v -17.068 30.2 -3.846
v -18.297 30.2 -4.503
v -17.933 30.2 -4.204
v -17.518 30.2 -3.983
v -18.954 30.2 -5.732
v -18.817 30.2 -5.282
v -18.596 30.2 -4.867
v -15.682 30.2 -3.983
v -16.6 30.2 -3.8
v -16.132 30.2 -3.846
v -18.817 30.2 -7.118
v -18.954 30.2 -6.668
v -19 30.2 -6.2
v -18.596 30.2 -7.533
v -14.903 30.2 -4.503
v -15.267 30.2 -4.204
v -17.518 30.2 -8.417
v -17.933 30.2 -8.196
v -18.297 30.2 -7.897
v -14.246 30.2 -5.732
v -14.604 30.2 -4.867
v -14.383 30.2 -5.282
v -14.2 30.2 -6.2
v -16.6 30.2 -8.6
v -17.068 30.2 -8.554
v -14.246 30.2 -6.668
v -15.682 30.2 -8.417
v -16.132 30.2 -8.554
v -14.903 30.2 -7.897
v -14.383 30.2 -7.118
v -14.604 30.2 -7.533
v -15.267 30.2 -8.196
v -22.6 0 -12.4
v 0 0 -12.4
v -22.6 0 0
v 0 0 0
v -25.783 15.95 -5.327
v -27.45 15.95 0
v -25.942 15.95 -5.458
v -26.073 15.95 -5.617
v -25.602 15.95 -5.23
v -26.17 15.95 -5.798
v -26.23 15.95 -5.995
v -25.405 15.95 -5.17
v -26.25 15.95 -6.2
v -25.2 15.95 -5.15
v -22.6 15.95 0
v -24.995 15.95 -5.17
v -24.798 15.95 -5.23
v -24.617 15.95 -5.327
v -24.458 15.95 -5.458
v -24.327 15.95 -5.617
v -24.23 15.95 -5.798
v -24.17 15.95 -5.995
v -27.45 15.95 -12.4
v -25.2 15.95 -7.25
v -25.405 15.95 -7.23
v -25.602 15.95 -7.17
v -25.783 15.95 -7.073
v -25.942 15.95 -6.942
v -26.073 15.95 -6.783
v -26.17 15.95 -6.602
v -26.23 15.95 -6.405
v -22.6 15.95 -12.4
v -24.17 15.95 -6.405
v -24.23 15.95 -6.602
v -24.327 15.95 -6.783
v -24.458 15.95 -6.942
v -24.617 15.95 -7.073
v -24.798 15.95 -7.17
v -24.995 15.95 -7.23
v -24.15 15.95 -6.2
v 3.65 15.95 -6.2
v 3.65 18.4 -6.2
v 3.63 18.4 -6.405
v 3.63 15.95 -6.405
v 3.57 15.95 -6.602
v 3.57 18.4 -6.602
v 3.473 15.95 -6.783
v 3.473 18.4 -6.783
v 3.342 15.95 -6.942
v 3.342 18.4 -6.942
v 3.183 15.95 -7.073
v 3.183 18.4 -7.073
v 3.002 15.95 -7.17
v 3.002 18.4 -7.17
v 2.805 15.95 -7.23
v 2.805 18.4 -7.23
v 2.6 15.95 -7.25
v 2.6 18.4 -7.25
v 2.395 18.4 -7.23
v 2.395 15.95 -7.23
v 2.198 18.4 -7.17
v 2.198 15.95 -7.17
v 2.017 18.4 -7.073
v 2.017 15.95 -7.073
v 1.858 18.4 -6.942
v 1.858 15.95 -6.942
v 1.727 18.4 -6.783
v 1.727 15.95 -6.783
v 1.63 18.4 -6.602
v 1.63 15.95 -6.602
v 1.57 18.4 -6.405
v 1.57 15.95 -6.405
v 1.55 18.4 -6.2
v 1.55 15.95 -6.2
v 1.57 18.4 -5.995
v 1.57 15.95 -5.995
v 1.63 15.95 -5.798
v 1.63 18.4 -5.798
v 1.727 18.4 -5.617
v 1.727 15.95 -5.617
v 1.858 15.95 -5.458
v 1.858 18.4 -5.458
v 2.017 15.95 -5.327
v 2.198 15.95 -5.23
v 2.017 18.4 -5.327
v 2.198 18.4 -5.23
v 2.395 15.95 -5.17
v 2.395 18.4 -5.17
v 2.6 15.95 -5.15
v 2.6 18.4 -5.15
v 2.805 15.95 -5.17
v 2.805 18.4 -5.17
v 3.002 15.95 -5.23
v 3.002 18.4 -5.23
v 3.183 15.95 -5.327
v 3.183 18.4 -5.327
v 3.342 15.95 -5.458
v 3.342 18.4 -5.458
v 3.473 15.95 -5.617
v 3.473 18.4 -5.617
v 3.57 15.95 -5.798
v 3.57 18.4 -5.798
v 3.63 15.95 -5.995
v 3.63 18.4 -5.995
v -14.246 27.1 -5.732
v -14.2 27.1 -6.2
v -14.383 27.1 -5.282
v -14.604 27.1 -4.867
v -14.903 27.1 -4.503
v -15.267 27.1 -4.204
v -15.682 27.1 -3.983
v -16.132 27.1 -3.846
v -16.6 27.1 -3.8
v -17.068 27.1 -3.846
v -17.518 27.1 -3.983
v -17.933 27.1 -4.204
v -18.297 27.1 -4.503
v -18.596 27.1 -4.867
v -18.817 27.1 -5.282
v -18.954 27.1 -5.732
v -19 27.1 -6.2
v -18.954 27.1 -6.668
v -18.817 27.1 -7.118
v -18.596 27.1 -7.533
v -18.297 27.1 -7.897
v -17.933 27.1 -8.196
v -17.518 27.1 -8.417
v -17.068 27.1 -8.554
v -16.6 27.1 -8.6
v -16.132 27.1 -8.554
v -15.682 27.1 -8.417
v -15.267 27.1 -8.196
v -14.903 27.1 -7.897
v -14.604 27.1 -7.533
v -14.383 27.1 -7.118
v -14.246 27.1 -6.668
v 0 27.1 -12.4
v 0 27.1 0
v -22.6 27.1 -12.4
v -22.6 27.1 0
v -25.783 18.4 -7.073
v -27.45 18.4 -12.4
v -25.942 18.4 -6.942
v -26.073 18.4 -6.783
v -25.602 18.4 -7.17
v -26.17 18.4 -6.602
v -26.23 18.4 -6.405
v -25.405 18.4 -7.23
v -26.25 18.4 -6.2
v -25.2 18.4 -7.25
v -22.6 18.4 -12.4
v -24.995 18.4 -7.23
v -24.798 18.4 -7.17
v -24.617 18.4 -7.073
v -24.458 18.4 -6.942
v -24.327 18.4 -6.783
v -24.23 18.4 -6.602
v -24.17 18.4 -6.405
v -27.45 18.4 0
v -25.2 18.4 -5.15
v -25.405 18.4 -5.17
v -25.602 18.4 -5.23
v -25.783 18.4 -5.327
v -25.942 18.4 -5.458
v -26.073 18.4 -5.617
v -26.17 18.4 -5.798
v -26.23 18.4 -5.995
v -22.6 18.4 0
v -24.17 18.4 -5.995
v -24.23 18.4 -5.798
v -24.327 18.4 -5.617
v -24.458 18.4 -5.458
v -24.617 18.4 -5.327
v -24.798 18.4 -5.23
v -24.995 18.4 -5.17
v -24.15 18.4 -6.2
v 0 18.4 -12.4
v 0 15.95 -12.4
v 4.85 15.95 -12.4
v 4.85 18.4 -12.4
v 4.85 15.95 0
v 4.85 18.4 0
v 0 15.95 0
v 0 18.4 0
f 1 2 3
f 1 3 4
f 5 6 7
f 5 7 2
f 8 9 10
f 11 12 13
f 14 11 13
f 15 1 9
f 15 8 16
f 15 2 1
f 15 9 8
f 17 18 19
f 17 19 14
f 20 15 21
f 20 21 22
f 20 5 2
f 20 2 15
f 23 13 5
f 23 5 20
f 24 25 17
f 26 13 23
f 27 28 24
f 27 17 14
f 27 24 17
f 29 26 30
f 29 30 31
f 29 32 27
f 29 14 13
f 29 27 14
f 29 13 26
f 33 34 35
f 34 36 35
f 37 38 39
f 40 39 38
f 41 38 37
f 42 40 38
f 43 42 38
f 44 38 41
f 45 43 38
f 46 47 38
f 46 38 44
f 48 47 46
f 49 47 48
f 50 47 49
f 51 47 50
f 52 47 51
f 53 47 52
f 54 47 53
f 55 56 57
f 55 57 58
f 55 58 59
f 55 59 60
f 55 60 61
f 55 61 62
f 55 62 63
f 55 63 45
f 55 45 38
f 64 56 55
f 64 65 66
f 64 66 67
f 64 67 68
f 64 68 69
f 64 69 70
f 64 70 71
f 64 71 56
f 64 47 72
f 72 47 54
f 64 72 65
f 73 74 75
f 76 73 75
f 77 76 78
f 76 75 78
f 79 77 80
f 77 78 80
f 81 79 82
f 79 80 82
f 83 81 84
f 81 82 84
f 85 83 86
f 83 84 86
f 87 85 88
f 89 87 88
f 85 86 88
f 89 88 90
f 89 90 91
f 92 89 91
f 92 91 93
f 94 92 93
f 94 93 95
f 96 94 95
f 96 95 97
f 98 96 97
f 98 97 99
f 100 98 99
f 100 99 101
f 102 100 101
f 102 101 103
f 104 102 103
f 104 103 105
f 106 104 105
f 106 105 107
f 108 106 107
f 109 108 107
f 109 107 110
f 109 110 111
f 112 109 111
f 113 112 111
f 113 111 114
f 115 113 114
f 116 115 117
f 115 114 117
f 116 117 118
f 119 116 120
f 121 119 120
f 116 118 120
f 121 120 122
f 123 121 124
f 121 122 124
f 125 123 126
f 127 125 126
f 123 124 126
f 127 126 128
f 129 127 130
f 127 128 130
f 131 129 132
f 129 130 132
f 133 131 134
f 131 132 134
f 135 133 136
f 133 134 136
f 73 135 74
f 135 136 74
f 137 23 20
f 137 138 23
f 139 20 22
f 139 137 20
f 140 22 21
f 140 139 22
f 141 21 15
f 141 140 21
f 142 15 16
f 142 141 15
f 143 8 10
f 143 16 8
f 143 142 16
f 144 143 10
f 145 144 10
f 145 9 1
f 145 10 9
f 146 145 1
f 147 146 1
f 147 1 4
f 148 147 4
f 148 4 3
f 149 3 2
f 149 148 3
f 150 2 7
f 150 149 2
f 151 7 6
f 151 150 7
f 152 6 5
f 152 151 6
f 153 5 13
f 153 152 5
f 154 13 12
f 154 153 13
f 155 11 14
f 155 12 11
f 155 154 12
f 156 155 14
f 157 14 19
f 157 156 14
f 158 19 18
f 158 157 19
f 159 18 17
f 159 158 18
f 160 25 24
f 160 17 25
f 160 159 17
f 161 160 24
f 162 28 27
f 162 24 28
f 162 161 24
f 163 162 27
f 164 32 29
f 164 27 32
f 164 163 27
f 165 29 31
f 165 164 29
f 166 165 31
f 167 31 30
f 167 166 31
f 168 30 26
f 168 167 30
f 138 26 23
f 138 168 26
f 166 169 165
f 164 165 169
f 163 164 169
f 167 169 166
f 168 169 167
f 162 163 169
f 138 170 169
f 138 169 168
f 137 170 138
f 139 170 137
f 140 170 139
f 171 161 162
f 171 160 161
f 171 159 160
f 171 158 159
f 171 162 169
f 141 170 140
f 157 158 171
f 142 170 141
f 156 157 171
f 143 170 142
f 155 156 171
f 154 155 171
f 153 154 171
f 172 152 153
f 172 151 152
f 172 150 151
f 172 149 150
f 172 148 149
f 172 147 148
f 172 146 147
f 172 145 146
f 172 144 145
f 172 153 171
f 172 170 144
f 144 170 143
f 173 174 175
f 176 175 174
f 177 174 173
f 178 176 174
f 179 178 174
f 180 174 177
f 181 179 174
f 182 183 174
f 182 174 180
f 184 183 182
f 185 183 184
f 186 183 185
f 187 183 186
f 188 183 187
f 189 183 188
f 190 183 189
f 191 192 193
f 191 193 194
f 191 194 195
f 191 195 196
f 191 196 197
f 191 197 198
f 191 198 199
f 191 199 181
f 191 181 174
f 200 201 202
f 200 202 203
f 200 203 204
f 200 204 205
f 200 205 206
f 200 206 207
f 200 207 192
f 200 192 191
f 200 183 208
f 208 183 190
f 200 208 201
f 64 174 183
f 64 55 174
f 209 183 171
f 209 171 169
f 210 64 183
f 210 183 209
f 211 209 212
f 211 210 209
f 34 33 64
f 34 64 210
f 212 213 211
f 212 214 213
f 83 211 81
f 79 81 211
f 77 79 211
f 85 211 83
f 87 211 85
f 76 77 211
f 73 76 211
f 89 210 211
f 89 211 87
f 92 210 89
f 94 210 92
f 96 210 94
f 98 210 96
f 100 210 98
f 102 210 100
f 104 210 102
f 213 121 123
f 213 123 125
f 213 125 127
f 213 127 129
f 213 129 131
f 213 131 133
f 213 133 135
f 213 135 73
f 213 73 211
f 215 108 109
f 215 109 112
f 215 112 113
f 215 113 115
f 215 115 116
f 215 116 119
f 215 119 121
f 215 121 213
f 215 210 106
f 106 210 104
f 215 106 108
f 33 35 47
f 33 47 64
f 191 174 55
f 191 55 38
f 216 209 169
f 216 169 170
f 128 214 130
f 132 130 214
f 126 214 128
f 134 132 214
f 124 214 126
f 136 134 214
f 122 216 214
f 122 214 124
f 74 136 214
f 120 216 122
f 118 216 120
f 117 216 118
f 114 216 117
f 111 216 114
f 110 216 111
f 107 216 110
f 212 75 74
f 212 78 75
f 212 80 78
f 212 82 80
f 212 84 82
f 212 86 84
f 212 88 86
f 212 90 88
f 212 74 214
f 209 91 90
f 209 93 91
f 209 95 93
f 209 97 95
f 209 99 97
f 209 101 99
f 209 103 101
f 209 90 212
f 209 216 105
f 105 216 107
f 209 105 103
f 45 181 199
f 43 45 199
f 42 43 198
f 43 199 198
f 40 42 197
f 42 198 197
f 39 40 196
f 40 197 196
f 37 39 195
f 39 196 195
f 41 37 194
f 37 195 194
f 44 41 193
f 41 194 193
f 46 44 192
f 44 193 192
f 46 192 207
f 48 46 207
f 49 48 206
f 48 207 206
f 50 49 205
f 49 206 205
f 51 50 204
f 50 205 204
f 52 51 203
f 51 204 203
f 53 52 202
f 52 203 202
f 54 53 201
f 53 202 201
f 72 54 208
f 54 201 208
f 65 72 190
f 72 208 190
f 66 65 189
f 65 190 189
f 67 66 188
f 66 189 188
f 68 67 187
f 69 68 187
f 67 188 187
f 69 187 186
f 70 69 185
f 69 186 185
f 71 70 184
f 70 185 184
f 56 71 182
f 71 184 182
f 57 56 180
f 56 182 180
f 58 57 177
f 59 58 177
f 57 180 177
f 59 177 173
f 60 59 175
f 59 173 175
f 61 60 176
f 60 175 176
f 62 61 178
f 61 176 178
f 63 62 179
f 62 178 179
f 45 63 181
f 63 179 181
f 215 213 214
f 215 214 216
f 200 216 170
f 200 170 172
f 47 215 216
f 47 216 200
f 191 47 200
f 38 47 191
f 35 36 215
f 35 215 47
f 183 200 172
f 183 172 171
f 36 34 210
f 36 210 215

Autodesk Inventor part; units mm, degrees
ref_plane "YZ Plane" through (0, 0, 0) normal (1, 0, 0) x (0, 1, 0)
sketch "Sketch1" plane through (0, 0, 0) normal (0, 1, 0) x (-1, 0, 0)
  line L0 (0, 0) -> (22.6, 0)
  line L1 (22.6, 0) -> (22.6, -12.4)
  line L2 (22.6, -12.4) -> (0, -12.4)
  line L3 (0, -12.4) -> (0, 0)
  dimension "d0" = 22.6
  dimension "d1" = 12.4
extrude "Extrusion1" add sketch "Sketch1" along normal blind 27.1
sketch "Sketch2" plane through (0, 27.1, 0) normal (0, 1, 0) x (1, 0, 0)
  circle A0 centre (-16.6, 6.2) radius 2.4
  line L0 (-22.6, 12.4) -> (-22.6, 0) projected
  line L1 (-22.6, 0) -> (0, 0) projected
  line L2 (0, 12.4) -> (-22.6, 12.4) projected
  dimension "d4" = 4.8
  dimension "d5" = 6
  dimension "d6" = 6.2
  dimension "d7" = 6.2
extrude "Extrusion2" add sketch "Sketch2" along normal blind 3.1
sketch "Sketch3" plane through (0, 0, 0) normal (1, 0, 0) x (0, 0, -1)
  line L0 (0, 0) -> (0, 27.1) projected
  line L1 (12.4, 0) -> (12.4, 27.1) projected
  line L2 (0, 18.4) -> (12.4, 18.4)
  line L3 (12.4, 18.4) -> (12.4, 15.95)
  line L4 (12.4, 15.95) -> (0, 15.95)
  line L5 (0, 15.95) -> (0, 18.4)
  line L6 (0, 27.1) -> (12.4, 27.1) projected
  dimension "d10" = 2.45
  dimension "d11" = 8.7
extrude "Extrusion3" add sketch "Sketch3" along normal blind 4.85 contours L0 L2 L1 L4
ref_plane "Work Plane1" through (-11.3, 27.1, 0) normal (1, 0, 0) x (0, 0, -1)
mirror "Mirror1" about plane through (-11.3, 27.1, 0) normal (1, 0, 0) of "Extrusion3"
sketch "Sketch4" plane through (0, 18.4, 0) normal (0, 1, 0) x (1, 0, 0)
  circle A0 centre (2.6, 6.2) radius 1.05
  line L0 (-11.3, 14.88) -> (-11.3, -2.48) projected
  line L1 (0, 12.4) -> (4.85, 12.4) projected
  line L2 (0, 0) -> (4.85, 0) projected
  dimension "d14" = 2.1
  dimension "d15" = 13.9
  dimension "d16" = 6.2
  dimension "d17" = 6.2
extrude "Extrusion4" cut sketch "Sketch4" against normal through all
mirror "Mirror2" about plane through (-11.3, 27.1, 0) normal (1, 0, 0) of "Extrusion4"
ref_plane "Work Plane3" through (-16.6, 27.1, -6.2) normal (-1, 0, 0) x (0, 0, 1)
ref_plane "Work Plane2" through (-11.3, 27.1, 0) normal (1, 0, 0) x (0, 0, -1)
equation "\"d7\" = d6"
equation "\"d17\" = d16"
properties part number "servo"
